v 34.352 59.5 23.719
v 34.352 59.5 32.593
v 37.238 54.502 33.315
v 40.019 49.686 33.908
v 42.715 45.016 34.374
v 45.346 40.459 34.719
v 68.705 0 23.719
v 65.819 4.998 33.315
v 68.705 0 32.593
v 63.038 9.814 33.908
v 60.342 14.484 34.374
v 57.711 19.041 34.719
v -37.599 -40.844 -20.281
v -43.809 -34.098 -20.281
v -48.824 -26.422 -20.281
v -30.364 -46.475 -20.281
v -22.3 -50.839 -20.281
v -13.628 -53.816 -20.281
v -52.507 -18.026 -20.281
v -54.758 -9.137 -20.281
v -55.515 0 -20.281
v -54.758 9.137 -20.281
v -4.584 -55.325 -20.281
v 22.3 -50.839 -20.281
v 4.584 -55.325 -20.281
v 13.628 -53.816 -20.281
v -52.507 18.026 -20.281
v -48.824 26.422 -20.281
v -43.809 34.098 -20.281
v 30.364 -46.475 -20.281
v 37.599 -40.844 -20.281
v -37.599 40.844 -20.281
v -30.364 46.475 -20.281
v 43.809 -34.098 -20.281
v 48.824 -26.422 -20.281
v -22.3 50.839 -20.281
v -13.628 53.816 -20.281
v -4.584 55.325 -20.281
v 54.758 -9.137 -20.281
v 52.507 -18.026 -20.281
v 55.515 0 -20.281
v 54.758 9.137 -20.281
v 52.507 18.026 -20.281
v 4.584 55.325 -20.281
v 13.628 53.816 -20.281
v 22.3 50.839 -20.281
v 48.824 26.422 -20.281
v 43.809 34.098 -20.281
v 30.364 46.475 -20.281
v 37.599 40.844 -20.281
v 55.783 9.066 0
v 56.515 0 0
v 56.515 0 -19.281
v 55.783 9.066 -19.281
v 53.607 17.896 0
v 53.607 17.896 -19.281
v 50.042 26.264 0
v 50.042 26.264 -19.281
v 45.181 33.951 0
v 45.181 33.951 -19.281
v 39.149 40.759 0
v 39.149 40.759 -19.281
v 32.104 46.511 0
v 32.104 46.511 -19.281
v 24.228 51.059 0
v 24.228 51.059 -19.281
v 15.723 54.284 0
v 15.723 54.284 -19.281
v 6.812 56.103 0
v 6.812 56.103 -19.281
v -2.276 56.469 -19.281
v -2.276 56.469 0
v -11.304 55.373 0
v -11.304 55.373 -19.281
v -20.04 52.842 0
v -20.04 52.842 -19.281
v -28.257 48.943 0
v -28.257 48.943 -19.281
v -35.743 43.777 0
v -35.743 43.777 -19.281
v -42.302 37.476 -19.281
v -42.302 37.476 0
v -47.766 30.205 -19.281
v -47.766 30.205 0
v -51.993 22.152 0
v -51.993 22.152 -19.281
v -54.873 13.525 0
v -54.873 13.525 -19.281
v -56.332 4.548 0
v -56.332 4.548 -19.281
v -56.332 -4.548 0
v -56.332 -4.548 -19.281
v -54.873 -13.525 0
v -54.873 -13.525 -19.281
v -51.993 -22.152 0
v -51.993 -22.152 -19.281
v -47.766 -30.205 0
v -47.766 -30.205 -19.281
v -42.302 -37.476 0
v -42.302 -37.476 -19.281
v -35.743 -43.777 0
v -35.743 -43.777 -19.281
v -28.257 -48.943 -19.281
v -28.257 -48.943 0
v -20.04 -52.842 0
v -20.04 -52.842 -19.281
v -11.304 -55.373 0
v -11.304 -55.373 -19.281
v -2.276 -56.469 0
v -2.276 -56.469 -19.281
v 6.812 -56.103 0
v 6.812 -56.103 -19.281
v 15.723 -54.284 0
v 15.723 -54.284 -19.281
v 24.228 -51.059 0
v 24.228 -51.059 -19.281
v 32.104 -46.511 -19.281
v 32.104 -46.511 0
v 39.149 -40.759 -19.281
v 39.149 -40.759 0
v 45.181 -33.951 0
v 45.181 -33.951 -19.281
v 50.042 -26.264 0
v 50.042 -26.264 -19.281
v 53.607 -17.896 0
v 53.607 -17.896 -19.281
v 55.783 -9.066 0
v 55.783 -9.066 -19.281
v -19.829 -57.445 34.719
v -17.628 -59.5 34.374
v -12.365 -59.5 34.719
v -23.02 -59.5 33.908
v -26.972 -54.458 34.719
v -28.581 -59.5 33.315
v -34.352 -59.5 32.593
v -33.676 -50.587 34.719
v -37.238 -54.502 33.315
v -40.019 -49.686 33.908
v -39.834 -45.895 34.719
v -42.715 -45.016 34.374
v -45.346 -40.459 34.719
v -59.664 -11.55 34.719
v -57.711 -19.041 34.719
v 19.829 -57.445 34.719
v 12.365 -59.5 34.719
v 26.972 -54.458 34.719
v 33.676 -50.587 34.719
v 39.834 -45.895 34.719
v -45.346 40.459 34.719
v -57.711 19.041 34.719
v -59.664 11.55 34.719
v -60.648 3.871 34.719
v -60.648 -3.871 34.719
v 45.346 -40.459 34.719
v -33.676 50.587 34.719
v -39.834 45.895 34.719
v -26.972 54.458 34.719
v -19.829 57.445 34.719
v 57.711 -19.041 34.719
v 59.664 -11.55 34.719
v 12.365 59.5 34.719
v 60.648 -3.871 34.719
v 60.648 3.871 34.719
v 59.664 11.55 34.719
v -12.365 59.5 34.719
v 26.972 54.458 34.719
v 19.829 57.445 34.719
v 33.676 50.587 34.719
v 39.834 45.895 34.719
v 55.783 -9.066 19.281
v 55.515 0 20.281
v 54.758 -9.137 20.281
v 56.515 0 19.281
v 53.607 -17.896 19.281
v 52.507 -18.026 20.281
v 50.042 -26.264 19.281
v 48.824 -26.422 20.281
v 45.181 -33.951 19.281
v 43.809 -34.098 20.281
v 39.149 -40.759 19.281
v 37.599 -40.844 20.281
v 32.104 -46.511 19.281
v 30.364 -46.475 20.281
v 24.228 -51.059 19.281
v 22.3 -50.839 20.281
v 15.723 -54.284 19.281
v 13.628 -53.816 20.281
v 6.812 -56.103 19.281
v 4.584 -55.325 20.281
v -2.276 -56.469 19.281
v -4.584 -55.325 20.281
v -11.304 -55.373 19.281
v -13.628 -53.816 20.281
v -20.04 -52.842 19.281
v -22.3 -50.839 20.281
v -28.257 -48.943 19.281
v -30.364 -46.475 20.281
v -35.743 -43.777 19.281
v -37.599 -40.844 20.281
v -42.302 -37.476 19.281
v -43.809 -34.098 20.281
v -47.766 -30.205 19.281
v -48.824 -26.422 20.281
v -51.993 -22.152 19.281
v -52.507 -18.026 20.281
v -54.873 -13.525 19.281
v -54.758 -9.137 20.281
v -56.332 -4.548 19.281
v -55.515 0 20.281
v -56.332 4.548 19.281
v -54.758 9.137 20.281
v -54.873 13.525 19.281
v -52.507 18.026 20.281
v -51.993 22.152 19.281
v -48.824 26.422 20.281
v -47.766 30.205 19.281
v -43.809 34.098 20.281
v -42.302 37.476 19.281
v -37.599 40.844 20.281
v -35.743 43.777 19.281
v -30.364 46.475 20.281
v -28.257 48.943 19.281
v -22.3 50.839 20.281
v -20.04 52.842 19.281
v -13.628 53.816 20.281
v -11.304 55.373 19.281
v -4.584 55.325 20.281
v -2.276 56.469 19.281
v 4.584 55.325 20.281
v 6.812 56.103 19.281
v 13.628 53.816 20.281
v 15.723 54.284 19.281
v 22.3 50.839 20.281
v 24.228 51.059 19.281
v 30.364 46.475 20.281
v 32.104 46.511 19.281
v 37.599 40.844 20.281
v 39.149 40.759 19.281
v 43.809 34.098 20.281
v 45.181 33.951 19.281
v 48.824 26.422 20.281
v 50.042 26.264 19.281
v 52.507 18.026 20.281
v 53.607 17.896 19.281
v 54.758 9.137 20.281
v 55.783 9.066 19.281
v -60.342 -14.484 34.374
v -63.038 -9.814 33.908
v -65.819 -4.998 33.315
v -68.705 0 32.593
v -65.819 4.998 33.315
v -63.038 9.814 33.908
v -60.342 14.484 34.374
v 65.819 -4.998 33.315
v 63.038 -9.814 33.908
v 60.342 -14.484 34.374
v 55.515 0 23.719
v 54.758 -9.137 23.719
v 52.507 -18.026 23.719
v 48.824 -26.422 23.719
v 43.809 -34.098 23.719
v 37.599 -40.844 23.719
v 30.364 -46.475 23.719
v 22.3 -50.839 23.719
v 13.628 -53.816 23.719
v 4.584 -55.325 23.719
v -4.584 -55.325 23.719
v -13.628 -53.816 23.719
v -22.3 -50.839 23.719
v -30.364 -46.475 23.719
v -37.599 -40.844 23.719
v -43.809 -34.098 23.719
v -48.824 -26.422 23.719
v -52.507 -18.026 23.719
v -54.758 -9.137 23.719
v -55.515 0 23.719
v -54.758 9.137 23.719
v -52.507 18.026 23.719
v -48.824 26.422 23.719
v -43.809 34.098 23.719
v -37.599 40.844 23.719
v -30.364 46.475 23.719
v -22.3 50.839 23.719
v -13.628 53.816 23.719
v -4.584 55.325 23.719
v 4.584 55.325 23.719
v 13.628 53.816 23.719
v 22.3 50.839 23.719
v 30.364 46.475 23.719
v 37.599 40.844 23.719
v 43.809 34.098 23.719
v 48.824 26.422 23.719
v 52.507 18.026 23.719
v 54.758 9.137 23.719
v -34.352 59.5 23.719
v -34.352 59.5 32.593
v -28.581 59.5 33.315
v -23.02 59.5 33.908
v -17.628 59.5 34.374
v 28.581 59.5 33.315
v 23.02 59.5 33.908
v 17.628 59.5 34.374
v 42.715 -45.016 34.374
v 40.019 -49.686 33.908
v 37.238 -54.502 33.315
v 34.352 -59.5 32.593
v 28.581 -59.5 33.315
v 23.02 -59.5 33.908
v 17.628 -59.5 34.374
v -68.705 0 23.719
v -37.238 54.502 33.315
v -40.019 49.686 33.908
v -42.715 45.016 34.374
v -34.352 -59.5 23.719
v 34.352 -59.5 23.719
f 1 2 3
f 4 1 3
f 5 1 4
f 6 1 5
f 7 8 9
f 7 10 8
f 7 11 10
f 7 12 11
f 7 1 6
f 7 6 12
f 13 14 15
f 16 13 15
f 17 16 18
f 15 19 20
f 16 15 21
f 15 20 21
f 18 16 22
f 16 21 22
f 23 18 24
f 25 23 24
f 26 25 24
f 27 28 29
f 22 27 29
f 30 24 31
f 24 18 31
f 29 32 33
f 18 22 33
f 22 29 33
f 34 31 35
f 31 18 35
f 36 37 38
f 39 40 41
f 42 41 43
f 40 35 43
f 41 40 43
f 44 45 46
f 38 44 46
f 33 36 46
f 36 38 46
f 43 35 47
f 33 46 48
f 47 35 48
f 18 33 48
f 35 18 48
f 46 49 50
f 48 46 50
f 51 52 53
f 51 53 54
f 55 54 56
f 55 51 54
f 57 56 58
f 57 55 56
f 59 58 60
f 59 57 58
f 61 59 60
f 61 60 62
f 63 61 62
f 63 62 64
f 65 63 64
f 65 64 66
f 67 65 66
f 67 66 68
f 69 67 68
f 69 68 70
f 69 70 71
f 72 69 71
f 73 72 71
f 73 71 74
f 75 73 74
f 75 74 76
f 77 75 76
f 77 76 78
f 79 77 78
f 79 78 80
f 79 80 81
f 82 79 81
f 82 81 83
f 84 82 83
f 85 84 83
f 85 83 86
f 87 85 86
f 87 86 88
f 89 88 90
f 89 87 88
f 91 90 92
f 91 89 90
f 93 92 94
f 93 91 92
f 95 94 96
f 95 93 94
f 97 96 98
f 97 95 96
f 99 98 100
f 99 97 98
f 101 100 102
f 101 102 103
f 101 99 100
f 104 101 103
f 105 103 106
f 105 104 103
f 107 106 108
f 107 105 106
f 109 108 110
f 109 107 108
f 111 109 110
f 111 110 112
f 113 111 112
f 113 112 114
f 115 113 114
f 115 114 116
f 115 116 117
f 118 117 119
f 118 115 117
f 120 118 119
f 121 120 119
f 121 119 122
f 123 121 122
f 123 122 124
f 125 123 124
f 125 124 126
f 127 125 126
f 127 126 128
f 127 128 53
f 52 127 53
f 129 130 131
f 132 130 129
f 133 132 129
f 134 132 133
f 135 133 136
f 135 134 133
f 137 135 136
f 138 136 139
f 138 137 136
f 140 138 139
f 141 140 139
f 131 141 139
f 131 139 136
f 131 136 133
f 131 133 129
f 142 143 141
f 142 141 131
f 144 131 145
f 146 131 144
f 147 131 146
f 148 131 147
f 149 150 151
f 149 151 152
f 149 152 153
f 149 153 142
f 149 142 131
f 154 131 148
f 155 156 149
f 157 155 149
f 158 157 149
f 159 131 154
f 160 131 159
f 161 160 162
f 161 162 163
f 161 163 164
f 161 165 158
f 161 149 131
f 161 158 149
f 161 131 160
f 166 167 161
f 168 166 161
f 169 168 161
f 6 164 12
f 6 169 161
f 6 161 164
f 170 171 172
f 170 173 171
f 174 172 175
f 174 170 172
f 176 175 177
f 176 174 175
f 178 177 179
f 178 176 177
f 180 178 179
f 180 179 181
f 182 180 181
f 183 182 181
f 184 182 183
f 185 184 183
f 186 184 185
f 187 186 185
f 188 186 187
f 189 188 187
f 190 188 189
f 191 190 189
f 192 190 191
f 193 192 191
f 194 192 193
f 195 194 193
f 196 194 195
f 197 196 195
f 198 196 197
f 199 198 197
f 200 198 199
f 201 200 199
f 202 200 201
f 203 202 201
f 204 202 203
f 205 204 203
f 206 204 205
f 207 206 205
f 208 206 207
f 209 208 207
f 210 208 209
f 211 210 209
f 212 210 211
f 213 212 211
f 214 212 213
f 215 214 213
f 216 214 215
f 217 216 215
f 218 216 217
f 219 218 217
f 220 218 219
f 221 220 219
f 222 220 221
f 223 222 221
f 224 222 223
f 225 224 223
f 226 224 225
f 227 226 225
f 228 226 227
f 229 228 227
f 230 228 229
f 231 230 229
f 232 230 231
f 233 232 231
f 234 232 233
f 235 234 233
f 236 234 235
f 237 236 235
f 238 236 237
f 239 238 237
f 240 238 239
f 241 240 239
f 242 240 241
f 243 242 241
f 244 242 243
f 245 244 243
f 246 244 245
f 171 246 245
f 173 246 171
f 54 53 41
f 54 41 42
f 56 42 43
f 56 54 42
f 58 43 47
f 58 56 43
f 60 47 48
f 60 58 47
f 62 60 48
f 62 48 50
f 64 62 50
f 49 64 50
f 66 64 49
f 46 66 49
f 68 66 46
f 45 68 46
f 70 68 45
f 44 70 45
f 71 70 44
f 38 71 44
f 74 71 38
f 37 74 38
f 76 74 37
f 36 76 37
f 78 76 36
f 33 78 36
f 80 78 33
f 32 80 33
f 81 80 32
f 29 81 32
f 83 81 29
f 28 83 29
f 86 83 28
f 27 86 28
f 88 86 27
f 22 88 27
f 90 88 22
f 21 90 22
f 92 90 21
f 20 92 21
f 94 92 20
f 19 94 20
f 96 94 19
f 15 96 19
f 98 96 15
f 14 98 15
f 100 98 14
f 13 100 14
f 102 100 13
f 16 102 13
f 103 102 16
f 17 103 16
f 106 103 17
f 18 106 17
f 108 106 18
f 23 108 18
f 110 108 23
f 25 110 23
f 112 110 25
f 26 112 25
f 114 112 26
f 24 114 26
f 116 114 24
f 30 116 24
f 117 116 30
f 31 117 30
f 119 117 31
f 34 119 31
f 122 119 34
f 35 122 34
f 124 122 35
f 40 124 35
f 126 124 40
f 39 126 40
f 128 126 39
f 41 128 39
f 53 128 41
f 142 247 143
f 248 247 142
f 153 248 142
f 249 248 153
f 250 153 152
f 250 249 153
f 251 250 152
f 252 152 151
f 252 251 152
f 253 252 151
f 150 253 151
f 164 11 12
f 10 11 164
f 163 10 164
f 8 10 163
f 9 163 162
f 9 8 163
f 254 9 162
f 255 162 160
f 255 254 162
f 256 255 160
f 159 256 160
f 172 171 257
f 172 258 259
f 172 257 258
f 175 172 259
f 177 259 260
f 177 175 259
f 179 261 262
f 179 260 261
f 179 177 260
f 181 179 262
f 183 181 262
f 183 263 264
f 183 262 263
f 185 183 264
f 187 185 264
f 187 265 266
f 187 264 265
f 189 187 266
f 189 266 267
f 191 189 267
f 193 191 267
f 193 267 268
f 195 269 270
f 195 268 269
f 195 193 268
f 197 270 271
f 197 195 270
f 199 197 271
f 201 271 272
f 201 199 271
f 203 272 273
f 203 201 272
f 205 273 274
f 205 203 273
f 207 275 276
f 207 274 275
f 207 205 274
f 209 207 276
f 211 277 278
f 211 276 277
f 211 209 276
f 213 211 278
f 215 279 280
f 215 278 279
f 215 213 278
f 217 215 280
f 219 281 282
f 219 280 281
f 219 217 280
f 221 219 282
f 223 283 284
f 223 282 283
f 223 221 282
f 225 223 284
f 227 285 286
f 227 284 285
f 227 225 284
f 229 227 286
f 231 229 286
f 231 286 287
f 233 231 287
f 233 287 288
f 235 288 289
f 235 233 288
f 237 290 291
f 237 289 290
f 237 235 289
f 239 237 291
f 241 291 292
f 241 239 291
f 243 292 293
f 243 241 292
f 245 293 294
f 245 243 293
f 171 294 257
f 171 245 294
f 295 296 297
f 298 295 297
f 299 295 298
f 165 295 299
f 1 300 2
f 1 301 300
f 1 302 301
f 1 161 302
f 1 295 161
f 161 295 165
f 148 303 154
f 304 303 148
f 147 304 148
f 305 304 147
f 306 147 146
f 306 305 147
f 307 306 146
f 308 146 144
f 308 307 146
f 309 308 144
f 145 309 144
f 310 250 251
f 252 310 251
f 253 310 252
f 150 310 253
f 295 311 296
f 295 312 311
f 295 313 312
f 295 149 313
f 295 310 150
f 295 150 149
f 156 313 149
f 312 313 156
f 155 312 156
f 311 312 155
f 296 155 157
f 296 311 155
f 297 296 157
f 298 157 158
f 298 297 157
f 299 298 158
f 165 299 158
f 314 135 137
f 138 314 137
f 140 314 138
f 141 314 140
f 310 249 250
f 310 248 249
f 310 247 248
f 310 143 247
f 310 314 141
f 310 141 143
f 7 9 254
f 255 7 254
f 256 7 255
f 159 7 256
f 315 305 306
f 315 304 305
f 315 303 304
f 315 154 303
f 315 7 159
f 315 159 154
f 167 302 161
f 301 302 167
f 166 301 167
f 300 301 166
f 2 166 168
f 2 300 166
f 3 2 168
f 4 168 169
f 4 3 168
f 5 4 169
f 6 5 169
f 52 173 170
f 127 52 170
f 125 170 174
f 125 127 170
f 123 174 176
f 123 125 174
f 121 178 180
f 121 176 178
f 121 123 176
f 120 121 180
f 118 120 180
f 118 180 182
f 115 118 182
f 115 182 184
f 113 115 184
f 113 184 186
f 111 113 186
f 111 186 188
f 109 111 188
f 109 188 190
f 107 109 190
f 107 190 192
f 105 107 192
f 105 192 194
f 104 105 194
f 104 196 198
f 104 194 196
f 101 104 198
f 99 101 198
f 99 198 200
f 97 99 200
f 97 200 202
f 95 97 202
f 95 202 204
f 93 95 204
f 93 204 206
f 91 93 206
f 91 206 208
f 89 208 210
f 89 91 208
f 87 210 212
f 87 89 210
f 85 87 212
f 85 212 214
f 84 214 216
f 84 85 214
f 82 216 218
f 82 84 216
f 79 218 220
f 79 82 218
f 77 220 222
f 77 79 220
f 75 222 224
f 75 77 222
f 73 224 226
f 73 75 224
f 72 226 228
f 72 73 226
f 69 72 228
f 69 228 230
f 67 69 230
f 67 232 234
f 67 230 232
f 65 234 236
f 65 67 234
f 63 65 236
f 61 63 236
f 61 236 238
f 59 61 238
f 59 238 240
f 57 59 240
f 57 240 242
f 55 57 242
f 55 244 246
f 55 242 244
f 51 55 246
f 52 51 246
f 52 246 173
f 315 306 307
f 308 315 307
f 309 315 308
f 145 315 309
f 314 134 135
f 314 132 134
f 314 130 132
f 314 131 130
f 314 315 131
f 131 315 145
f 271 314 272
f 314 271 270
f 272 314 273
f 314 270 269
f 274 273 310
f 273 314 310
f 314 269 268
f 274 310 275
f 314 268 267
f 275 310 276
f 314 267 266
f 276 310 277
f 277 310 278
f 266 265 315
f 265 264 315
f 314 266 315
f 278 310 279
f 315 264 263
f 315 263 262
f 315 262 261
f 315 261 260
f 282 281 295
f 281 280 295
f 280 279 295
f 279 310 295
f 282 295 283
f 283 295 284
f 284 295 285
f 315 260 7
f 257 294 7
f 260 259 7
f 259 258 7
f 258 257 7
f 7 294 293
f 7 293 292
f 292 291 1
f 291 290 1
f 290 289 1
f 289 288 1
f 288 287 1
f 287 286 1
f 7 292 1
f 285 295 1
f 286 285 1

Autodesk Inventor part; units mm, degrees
ref_plane "YZ Plane" through (0, 0, 0) normal (1, 0, 0) x (0, 1, 0)
ref_plane "XZ Plane" through (0, 0, 0) normal (0, 1, 0) x (-1, 0, 0)
ref_plane "XY Plane" through (0, 0, 0) normal (0, 0, 1) x (1, 0, 0)
sketch "Szkic7" plane through (0, 0, 0) normal (0, 0, 1) x (1, 0, 0)
  circle A0 centre (0, 0) radius 56.515
  dimension "d35" = 113.03
extrude "Wyciągnięcie proste2" add sketch "Szkic7" along normal mid plane 40.5625
chamfer "Faza2" distance 1 angle 45 1 edges at (-56.515, 0, 20.2812)
sketch "Szkic9" plane through (0, 0, 20.2812) normal (0, 0, 1) x (1, 0, 0)
  circle A0 centre (0, 0) radius 55.515 projected
extrude "Wyciągnięcie proste3" add sketch "Szkic9" along normal blind 3.4375
sketch "Szkic10" plane through (0, 0, 23.7188) normal (0, 0, 1) x (1, 0, 0)
  line L0 (-34.3523, 59.5) -> (34.3523, 59.5)
  line L1 (34.3523, 59.5) -> (68.7047, 0)
  line L2 (68.7047, 0) -> (34.3523, -59.5)
  line L3 (34.3523, -59.5) -> (-34.3523, -59.5)
  line L4 (-34.3523, -59.5) -> (-68.7047, 0)
  line L5 (-68.7047, 0) -> (-34.3523, 59.5)
  line L6 (0, 79.121) -> (0, -79.121) construction
  line L7 (-79.121, 0) -> (79.121, 0) construction
  point P0 (0, 0)
  point P1 (0, 0)
  point P2 (0, 59.5)
  dimension "d44" = 119
extrude "Wyciągnięcie proste4" add sketch "Szkic10" along normal blind 11
sketch "Szkic12" plane through (0, 0, 0) normal (0, 1, 0) x (-1, 0, 0)
  line L0 (0, -2.1463) -> (0, 12.8775) construction
  line L1 (-34.3523, 23.7188) -> (-34.3523, 34.7188) construction
  line L2 (-68.7047, 34.7188) -> (-34.3523, 34.7188) construction
  line L3 (-68.7047, 23.7188) -> (-68.7047, 34.7188) projected
  line L4 (-68.7047, 32.593) -> (-60.7713, 34.7188)
  line L5 (-68.7047, 34.7188) -> (-34.3523, 34.7188) projected
  line L6 (-68.7047, 23.7188) -> (-34.3523, 23.7188) projected
  point P0 (0, 0)
  dimension "d50" = 15
  dimension "d51" = 7.9333
revolve "Obrót2" cut sketch "Szkic12" angle 360 about axis through (0, 0, -10) along (0, 0, 1)
thread "Gwint3" size "G113.03x2.309" designation "G 4" class "A" standard "ISO Pipe Threads" full length
chamfer "Faza3" distance 1 angle 45 1 edges at (-56.515, 0, -20.2812)
equation "\"d35\" = OD"
equation "\"d36\" = 0.7375 * L"
equation "\"d42\" = 0.0625 * L"
equation "\"d44\" = SW"
equation "\"d45\" = 0.2 * L"
equation "\"d51\" = 0.0666667 * SW"
equation "\"SzerokośćGięciaPodcięcia\" = Grubość"
equation "\"RozmiarPodcięciaNarożnika\" = 4 * Grubość"
equation "\"PromieńPrzejścia\" = PromieńGięcia"
equation "\"Rozmiar_promienia_Jacobiego\" = PromieńGięcia"
equation "\"Wielk_odstępu\" = Grubość"
equation "\"d2\" = PromieńGięcia"
equation "\"d23\" = PromieńGięcia"
equation "\"OD\" = 113.03"
equation "\"SW\" = 119"
equation "\"L\" = 55"
equation "\"Grubość\" = 1.5"
equation "\"PromieńGięcia\" = 3"
properties part number "Korek sześciokątny BSP 4'' L=55" material "304"
